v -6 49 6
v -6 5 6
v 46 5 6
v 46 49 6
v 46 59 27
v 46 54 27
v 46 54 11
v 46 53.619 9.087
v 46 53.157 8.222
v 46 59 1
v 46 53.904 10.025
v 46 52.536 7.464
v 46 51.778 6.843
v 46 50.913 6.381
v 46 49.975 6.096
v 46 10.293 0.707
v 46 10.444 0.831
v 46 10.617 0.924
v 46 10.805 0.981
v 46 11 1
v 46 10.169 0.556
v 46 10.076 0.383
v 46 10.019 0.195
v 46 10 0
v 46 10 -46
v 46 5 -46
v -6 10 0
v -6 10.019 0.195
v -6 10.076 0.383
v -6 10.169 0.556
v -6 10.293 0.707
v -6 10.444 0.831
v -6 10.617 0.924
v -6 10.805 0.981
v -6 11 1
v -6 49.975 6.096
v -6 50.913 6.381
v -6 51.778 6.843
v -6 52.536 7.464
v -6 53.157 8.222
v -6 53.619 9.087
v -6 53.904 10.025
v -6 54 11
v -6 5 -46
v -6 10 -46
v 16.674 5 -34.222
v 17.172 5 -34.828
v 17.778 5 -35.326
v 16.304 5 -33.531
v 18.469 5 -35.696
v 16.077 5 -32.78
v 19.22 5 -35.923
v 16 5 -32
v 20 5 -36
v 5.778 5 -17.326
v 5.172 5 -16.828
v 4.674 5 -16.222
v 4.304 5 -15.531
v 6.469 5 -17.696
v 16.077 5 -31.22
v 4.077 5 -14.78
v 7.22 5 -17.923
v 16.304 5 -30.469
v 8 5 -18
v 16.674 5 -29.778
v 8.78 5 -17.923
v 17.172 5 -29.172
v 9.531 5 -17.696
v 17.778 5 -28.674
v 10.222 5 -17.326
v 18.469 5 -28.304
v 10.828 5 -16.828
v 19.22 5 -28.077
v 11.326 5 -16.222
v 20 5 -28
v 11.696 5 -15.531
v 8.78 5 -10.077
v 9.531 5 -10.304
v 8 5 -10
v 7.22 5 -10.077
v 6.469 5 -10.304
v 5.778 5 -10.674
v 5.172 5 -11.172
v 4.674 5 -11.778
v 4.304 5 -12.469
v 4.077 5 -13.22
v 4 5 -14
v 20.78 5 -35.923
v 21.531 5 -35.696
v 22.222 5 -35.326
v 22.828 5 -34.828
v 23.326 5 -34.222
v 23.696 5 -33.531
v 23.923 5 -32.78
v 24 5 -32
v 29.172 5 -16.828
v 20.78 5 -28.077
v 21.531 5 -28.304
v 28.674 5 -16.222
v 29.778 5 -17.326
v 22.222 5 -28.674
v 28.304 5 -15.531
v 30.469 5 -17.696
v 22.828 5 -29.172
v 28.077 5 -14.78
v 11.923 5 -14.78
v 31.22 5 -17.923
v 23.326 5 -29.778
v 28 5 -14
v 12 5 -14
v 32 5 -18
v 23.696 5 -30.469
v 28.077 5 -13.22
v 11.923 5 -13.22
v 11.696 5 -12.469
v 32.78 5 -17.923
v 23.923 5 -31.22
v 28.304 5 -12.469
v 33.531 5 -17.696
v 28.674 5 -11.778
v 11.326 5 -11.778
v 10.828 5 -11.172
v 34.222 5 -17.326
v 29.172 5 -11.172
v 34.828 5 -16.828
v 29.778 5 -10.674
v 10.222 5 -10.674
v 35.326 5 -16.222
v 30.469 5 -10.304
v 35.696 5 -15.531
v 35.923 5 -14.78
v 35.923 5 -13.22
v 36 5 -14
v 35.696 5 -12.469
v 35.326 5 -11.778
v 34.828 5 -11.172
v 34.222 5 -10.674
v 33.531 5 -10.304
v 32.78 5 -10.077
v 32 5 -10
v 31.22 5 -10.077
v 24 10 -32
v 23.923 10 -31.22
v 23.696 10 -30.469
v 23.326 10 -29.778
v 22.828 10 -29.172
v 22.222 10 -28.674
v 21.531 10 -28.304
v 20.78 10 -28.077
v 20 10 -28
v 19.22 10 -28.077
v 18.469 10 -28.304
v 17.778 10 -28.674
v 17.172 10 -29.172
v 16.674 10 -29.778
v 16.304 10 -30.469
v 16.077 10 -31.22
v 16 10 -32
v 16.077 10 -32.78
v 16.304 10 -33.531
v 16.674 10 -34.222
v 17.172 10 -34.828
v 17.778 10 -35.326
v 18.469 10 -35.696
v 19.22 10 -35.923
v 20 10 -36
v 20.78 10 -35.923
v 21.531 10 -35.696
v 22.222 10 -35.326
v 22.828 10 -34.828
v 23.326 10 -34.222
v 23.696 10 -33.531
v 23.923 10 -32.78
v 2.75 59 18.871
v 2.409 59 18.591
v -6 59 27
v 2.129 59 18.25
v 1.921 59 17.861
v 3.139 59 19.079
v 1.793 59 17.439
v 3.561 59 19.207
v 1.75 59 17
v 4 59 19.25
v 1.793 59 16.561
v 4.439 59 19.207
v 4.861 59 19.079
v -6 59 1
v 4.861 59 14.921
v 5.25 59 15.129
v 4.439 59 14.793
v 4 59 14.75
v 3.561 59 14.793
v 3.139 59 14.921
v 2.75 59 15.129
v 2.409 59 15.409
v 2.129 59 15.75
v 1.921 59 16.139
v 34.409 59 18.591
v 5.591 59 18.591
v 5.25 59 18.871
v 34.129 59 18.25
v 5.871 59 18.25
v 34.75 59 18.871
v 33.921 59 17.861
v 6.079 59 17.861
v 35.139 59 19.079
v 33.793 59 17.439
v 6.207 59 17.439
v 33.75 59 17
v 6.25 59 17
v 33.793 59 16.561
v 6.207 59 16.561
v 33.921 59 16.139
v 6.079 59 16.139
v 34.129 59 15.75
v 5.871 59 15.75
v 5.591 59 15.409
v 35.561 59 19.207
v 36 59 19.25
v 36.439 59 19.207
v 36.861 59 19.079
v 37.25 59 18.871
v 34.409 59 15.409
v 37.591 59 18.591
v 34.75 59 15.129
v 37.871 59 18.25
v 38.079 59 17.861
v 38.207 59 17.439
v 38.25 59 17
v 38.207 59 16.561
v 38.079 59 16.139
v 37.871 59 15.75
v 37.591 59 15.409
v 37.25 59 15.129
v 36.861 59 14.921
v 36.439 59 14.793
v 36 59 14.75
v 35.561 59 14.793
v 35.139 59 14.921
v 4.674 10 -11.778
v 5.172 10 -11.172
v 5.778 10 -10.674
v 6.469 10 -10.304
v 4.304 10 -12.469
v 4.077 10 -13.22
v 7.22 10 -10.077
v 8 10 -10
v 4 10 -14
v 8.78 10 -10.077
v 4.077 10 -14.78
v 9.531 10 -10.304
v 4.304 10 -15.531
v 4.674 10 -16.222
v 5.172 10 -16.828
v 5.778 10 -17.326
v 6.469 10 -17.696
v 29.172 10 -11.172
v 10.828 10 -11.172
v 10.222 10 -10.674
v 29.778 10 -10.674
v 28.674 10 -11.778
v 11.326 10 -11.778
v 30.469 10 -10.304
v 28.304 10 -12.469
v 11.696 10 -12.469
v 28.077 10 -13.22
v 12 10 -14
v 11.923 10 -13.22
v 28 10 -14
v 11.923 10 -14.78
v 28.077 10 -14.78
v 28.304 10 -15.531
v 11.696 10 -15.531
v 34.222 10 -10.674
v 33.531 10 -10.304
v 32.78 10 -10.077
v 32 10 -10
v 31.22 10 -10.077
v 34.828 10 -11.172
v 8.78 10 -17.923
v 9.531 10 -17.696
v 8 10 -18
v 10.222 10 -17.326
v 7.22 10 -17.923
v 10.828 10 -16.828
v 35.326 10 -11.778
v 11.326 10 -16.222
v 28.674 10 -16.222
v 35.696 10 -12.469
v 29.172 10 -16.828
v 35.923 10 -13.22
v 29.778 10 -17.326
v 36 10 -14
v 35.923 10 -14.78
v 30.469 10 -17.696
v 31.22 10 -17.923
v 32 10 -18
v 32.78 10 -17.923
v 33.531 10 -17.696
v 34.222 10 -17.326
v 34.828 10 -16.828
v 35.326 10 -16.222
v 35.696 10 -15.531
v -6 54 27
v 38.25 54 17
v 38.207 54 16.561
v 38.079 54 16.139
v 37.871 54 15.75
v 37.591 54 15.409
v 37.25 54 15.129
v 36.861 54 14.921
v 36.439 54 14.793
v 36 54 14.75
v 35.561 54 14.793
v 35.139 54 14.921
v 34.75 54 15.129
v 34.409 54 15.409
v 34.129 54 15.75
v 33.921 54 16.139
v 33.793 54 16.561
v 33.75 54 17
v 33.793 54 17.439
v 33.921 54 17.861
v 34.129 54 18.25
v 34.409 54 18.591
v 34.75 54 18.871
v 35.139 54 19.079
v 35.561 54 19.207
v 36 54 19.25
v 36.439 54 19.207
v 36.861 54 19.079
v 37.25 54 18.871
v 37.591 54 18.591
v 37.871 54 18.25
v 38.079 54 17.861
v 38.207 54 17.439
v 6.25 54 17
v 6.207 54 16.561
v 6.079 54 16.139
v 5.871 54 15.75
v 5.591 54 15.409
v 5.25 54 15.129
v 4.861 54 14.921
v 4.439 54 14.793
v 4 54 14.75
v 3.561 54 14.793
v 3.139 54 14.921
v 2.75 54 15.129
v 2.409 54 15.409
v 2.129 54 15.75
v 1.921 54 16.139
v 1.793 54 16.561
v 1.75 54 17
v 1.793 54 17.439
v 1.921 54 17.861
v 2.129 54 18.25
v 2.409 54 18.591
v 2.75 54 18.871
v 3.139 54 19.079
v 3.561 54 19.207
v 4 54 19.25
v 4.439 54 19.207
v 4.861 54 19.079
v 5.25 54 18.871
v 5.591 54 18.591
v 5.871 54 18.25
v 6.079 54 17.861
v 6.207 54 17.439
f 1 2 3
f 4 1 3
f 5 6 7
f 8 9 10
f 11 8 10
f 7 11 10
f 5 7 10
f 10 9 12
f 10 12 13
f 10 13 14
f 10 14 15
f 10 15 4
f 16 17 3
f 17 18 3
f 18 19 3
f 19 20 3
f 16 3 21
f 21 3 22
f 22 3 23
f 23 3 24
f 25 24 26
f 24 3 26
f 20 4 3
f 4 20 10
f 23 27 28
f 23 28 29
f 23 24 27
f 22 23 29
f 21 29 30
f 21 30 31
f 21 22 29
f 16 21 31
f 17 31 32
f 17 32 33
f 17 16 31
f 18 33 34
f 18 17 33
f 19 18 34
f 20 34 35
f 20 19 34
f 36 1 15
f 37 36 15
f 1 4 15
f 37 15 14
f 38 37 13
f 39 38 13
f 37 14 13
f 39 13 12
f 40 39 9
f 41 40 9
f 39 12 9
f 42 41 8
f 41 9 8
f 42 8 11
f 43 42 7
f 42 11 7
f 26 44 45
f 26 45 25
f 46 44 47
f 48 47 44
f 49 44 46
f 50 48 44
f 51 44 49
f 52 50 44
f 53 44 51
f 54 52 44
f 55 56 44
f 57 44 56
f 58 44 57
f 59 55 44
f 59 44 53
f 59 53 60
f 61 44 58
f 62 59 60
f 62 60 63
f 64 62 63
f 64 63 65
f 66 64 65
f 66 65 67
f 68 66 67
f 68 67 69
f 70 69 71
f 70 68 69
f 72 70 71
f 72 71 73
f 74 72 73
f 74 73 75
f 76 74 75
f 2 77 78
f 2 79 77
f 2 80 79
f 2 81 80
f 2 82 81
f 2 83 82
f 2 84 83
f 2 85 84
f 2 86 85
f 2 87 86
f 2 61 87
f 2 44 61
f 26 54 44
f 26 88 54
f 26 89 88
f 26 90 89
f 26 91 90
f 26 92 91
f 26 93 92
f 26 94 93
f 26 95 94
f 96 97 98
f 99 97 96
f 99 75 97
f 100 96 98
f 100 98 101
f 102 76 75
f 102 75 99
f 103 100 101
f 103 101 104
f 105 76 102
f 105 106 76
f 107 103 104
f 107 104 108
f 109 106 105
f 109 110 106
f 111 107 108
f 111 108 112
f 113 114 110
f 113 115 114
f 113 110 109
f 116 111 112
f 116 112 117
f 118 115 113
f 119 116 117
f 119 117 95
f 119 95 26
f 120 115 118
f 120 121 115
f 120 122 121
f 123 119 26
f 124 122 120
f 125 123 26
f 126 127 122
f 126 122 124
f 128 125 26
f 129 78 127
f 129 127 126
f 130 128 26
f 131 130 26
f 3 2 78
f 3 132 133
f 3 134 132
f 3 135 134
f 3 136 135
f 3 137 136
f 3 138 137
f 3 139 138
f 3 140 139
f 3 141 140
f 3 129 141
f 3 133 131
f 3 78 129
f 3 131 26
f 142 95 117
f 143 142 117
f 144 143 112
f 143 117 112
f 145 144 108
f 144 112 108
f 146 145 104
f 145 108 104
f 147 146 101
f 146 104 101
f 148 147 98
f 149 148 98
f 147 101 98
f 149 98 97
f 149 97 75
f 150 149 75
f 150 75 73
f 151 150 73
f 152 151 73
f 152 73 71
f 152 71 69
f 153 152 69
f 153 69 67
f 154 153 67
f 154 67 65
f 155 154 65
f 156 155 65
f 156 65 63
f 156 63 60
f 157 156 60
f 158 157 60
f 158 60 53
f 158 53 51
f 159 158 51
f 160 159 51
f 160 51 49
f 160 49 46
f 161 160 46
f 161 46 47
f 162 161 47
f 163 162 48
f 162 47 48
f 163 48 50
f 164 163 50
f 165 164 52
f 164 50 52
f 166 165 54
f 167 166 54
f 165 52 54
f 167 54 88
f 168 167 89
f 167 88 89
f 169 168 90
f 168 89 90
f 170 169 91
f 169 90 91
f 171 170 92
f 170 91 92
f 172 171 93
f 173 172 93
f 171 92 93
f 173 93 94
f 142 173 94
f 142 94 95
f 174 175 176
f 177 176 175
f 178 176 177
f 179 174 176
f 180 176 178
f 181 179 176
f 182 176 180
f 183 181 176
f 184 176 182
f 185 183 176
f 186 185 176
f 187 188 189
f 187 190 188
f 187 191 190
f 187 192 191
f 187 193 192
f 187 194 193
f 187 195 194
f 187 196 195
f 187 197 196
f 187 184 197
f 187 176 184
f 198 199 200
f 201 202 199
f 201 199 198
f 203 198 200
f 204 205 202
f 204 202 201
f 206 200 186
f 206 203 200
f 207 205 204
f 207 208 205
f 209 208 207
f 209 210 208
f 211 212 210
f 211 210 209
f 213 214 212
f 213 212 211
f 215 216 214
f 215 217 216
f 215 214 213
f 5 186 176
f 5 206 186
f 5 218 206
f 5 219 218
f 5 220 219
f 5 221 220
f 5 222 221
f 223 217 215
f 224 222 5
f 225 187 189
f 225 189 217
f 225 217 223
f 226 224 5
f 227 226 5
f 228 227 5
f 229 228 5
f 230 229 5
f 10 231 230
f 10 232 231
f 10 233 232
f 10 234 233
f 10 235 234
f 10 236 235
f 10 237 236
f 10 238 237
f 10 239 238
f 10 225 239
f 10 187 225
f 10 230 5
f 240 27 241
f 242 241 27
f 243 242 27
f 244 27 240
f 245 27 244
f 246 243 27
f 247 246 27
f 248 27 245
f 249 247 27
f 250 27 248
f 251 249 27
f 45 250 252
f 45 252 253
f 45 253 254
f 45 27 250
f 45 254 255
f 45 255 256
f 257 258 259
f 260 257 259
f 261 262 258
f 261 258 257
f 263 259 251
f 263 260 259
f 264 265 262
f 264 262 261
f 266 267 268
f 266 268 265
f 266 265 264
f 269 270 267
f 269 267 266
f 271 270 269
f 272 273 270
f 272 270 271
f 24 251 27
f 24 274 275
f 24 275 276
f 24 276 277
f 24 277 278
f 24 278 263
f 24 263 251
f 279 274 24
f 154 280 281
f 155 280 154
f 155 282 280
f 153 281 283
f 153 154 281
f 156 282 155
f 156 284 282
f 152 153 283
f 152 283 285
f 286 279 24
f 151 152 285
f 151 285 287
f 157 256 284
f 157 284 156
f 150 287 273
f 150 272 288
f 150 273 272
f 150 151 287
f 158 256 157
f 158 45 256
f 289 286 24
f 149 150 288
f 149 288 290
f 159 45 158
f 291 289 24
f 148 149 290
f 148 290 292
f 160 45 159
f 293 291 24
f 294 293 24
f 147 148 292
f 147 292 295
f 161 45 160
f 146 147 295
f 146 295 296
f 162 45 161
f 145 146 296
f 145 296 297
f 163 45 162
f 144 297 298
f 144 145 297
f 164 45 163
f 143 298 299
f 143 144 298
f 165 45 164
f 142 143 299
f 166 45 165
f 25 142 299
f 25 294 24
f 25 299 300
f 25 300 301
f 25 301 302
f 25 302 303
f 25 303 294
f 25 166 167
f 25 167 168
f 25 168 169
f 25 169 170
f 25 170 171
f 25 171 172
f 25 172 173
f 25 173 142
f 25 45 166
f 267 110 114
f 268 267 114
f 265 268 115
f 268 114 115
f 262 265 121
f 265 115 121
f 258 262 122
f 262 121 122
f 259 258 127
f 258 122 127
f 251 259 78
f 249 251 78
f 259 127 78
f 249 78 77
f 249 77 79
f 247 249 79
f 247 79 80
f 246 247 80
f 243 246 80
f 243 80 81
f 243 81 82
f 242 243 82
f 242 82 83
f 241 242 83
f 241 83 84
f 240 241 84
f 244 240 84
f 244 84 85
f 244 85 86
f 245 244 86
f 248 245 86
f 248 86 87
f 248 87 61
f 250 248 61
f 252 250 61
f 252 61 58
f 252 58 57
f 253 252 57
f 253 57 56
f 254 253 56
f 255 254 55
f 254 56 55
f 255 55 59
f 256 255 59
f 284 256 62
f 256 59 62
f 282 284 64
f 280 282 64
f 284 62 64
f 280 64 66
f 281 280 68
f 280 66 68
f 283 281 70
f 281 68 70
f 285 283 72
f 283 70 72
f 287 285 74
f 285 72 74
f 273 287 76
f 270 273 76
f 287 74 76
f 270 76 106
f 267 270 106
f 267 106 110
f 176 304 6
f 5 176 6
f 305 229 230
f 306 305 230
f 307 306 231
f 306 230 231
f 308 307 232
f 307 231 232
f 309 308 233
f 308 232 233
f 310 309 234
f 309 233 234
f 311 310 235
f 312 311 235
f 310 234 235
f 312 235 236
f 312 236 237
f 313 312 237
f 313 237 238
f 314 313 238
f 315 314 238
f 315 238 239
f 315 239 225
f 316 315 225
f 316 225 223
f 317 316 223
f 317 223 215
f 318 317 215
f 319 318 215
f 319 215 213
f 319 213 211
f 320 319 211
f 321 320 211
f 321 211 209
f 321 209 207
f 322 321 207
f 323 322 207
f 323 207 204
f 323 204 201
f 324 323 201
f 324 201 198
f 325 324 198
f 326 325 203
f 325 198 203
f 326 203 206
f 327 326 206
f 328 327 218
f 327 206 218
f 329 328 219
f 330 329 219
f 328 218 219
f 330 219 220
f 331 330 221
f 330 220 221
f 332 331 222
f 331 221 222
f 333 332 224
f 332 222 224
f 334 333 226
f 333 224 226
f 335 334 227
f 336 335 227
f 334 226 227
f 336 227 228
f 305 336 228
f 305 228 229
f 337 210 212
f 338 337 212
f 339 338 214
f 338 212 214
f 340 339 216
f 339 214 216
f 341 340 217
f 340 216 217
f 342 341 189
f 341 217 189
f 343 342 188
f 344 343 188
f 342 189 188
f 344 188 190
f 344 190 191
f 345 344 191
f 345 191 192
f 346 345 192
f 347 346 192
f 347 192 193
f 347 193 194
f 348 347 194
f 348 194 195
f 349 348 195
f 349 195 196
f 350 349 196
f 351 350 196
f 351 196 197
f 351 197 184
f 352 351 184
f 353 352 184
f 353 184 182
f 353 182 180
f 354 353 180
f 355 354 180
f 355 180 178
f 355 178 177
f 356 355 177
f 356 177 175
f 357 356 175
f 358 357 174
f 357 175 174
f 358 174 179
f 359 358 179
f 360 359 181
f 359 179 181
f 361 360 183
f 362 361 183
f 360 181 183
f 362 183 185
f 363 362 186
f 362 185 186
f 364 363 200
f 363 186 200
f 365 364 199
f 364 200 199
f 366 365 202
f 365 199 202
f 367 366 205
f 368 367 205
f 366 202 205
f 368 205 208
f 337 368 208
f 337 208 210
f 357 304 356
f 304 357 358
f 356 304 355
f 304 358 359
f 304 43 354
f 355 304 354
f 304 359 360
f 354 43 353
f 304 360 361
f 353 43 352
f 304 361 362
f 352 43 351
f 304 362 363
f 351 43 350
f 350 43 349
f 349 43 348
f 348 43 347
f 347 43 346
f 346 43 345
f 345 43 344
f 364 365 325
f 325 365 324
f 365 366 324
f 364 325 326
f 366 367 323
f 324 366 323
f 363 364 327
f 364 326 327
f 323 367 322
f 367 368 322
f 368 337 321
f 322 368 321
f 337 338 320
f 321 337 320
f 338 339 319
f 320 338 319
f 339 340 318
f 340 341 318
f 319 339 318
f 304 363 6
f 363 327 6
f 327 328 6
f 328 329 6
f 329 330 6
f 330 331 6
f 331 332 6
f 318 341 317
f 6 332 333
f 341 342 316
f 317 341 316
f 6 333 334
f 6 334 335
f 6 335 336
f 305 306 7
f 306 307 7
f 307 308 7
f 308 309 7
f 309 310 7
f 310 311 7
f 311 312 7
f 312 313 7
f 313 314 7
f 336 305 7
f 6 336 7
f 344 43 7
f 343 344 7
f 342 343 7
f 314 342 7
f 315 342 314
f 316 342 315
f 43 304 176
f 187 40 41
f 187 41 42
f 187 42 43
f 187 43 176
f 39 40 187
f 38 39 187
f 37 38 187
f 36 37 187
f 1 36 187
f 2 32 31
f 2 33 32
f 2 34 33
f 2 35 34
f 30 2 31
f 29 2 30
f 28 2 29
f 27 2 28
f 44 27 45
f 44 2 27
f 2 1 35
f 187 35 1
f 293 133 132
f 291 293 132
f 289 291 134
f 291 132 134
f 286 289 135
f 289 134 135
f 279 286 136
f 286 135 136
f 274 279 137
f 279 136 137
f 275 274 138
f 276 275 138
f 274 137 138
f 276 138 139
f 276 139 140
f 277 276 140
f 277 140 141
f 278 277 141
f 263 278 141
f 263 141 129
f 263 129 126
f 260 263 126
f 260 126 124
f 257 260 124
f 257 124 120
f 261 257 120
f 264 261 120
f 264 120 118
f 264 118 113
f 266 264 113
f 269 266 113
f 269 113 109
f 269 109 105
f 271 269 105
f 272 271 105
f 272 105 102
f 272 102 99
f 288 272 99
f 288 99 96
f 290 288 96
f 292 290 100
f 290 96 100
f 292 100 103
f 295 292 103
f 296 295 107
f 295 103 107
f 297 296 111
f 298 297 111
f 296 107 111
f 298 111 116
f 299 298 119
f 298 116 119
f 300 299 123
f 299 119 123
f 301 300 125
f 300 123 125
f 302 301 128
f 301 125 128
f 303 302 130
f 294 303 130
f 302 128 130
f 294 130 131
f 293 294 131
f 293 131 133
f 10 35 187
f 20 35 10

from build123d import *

# Parameters (mm, degrees)
SKETCH1_W           = 52
SKETCH1_H           = 52
SKETCH1_W_2         = 42
SKETCH1_H_2         = 42
BOSS_EXTRUDE1_DEPTH = 5
SKETCH2_W           = 52
SKETCH2_H           = 52
BOSS_EXTRUDE2_DEPTH = 5
SKETCH3_W           = 52
SKETCH3_H           = 5
BOSS_EXTRUDE3_DEPTH = 44
SKETCH4_W           = 52
SKETCH4_H           = 26
BOSS_EXTRUDE4_DEPTH = 5
SKETCH5_R           = 2.25
CUT_EXTRUDE1_DEPTH  = 60
FILLET1_R           = 5
FILLET2_R           = 1
SKETCH7_R           = 4
CUT_EXTRUDE2_DEPTH  = 55
SKETCH8_W           = 52
SKETCH8_H           = 52
SKETCH8_W_2         = 42
SKETCH8_H_2         = 42
CUT_EXTRUDE3_DEPTH  = 5


with BuildPart() as part:
    # Sketch1 → Boss-Extrude1 (new body)
    with BuildSketch(Plane(origin=(0, 0, 0), x_dir=(1, 0, 0), z_dir=(0, 1, 0))):
        with Locations((20, 20)):
            Rectangle(SKETCH1_W, SKETCH1_H)
        with Locations((20, 20)):
            Rectangle(SKETCH1_W_2, SKETCH1_H_2, mode=Mode.SUBTRACT)
    extrude(amount=BOSS_EXTRUDE1_DEPTH)

    # Sketch2 → Boss-Extrude2 (add)
    with BuildSketch(Plane(origin=(0, 5, 0), x_dir=(1, 0, 0), z_dir=(0, 1, 0))):
        with Locations((20, 20)):
            Rectangle(SKETCH2_W, SKETCH2_H)
    extrude(amount=BOSS_EXTRUDE2_DEPTH)

    # Sketch3 → Boss-Extrude3 (add)
    with BuildSketch(Plane(origin=(0, 10, 0), x_dir=(1, 0, 0), z_dir=(0, 1, 0))):
        with Locations((20, -3.5)):
            Rectangle(SKETCH3_W, SKETCH3_H)
    extrude(amount=BOSS_EXTRUDE3_DEPTH)

    # Sketch4 → Boss-Extrude4 (add)
    with BuildSketch(Plane(origin=(0, 54, 0), x_dir=(1, 0, 0), z_dir=(0, 1, 0))):
        with Locations((20, -14)):
            Rectangle(SKETCH4_W, SKETCH4_H)
    extrude(amount=BOSS_EXTRUDE4_DEPTH)

    # Sketch5 → Cut-Extrude1 (cut, through all)
    with BuildSketch(Plane(origin=(0, 59, 0), x_dir=(1, 0, 0), z_dir=(0, 1, 0))):
        with Locations((36, -17)):
            Circle(SKETCH5_R)
        with Locations((4, -17)):
            Circle(SKETCH5_R)
    extrude(amount=-CUT_EXTRUDE1_DEPTH, mode=Mode.SUBTRACT)

    # Fillet1
    fillet1_edges = [part.edges().sort_by_distance(p)[0] for p in [
        (20, 54, 6),
    ]]
    fillet(fillet1_edges, radius=FILLET1_R)

    # Fillet2
    fillet2_edges = [part.edges().sort_by_distance(p)[0] for p in [
        (20, 10, 1),
    ]]
    fillet(fillet2_edges, radius=FILLET2_R)

    # Sketch7 → Cut-Extrude2 (cut, through all)
    with BuildSketch(Plane.XZ.offset(-5)):
        with Locations((20, -32)):
            Circle(SKETCH7_R)
        with Locations((32, -14)):
            Circle(SKETCH7_R)
        with Locations((8, -14)):
            Circle(SKETCH7_R)
    extrude(amount=-CUT_EXTRUDE2_DEPTH, mode=Mode.SUBTRACT)

    # Sketch8 → Cut-Extrude3 (cut)
    with BuildSketch(Plane.XZ):
        with Locations((20, -20)):
            Rectangle(SKETCH8_W, SKETCH8_H)
        with Locations((20, -20)):
            Rectangle(SKETCH8_W_2, SKETCH8_H_2, mode=Mode.SUBTRACT)
    extrude(amount=-CUT_EXTRUDE3_DEPTH, mode=Mode.SUBTRACT)


solid = part.part
